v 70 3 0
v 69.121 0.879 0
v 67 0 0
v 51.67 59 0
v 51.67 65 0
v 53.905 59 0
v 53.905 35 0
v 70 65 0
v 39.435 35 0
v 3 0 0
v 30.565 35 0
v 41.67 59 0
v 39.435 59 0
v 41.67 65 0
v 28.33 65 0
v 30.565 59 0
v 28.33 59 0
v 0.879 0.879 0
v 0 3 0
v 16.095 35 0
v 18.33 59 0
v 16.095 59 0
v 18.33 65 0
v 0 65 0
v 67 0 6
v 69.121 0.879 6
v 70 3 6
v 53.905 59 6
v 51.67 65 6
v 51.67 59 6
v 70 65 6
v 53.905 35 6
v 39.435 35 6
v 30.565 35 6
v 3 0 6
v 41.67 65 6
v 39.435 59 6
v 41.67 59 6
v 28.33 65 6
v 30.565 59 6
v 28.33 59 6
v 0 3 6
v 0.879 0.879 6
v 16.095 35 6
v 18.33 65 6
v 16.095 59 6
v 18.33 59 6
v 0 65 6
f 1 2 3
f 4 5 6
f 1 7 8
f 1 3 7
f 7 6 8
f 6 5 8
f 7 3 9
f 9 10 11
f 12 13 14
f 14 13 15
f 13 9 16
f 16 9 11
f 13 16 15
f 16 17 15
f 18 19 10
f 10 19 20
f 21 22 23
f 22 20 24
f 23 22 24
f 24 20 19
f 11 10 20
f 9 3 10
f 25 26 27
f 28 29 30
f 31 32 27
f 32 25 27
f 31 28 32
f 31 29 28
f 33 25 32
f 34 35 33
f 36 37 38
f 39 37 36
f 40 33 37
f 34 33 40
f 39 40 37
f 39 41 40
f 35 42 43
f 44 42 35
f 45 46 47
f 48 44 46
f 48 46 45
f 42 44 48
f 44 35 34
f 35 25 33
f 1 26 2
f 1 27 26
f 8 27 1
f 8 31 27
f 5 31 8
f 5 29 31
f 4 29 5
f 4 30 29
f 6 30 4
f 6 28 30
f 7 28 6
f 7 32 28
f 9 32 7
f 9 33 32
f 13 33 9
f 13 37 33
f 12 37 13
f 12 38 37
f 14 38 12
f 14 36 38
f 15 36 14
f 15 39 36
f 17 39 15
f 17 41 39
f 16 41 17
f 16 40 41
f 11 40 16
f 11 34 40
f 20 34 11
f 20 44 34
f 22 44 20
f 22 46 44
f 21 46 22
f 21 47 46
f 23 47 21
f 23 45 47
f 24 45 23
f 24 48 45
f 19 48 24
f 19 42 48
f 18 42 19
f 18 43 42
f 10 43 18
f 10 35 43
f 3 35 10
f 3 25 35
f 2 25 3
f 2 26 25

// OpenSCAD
$fn = 32;

// ----------------------------------------------------------------------
// Window plate: 70 x 65 mm, 2 open windows
// ----------------------------------------------------------------------

// --- parameters (mm) ---
profile_height = 6;       // extrusion height
profile_points = 24;      // points of the closed outline

profile = [[0, 3], [0.879, 0.879], [3, 0], [67, 0], [69.121, 0.879], [70, 3], [70, 65], [51.67, 65], [51.67, 59], [53.905, 59], [53.905, 35], [39.435, 35], [39.435, 59], [41.67, 59], [41.67, 65], [28.33, 65], [28.33, 59], [30.565, 59], [30.565, 35], [16.095, 35], [16.095, 59], [18.33, 59], [18.33, 65], [0, 65]];  // single closed polygon, 24 points, counter clockwise

// --- the one profile operation ---
linear_extrude(height = profile_height) polygon(points = profile);
